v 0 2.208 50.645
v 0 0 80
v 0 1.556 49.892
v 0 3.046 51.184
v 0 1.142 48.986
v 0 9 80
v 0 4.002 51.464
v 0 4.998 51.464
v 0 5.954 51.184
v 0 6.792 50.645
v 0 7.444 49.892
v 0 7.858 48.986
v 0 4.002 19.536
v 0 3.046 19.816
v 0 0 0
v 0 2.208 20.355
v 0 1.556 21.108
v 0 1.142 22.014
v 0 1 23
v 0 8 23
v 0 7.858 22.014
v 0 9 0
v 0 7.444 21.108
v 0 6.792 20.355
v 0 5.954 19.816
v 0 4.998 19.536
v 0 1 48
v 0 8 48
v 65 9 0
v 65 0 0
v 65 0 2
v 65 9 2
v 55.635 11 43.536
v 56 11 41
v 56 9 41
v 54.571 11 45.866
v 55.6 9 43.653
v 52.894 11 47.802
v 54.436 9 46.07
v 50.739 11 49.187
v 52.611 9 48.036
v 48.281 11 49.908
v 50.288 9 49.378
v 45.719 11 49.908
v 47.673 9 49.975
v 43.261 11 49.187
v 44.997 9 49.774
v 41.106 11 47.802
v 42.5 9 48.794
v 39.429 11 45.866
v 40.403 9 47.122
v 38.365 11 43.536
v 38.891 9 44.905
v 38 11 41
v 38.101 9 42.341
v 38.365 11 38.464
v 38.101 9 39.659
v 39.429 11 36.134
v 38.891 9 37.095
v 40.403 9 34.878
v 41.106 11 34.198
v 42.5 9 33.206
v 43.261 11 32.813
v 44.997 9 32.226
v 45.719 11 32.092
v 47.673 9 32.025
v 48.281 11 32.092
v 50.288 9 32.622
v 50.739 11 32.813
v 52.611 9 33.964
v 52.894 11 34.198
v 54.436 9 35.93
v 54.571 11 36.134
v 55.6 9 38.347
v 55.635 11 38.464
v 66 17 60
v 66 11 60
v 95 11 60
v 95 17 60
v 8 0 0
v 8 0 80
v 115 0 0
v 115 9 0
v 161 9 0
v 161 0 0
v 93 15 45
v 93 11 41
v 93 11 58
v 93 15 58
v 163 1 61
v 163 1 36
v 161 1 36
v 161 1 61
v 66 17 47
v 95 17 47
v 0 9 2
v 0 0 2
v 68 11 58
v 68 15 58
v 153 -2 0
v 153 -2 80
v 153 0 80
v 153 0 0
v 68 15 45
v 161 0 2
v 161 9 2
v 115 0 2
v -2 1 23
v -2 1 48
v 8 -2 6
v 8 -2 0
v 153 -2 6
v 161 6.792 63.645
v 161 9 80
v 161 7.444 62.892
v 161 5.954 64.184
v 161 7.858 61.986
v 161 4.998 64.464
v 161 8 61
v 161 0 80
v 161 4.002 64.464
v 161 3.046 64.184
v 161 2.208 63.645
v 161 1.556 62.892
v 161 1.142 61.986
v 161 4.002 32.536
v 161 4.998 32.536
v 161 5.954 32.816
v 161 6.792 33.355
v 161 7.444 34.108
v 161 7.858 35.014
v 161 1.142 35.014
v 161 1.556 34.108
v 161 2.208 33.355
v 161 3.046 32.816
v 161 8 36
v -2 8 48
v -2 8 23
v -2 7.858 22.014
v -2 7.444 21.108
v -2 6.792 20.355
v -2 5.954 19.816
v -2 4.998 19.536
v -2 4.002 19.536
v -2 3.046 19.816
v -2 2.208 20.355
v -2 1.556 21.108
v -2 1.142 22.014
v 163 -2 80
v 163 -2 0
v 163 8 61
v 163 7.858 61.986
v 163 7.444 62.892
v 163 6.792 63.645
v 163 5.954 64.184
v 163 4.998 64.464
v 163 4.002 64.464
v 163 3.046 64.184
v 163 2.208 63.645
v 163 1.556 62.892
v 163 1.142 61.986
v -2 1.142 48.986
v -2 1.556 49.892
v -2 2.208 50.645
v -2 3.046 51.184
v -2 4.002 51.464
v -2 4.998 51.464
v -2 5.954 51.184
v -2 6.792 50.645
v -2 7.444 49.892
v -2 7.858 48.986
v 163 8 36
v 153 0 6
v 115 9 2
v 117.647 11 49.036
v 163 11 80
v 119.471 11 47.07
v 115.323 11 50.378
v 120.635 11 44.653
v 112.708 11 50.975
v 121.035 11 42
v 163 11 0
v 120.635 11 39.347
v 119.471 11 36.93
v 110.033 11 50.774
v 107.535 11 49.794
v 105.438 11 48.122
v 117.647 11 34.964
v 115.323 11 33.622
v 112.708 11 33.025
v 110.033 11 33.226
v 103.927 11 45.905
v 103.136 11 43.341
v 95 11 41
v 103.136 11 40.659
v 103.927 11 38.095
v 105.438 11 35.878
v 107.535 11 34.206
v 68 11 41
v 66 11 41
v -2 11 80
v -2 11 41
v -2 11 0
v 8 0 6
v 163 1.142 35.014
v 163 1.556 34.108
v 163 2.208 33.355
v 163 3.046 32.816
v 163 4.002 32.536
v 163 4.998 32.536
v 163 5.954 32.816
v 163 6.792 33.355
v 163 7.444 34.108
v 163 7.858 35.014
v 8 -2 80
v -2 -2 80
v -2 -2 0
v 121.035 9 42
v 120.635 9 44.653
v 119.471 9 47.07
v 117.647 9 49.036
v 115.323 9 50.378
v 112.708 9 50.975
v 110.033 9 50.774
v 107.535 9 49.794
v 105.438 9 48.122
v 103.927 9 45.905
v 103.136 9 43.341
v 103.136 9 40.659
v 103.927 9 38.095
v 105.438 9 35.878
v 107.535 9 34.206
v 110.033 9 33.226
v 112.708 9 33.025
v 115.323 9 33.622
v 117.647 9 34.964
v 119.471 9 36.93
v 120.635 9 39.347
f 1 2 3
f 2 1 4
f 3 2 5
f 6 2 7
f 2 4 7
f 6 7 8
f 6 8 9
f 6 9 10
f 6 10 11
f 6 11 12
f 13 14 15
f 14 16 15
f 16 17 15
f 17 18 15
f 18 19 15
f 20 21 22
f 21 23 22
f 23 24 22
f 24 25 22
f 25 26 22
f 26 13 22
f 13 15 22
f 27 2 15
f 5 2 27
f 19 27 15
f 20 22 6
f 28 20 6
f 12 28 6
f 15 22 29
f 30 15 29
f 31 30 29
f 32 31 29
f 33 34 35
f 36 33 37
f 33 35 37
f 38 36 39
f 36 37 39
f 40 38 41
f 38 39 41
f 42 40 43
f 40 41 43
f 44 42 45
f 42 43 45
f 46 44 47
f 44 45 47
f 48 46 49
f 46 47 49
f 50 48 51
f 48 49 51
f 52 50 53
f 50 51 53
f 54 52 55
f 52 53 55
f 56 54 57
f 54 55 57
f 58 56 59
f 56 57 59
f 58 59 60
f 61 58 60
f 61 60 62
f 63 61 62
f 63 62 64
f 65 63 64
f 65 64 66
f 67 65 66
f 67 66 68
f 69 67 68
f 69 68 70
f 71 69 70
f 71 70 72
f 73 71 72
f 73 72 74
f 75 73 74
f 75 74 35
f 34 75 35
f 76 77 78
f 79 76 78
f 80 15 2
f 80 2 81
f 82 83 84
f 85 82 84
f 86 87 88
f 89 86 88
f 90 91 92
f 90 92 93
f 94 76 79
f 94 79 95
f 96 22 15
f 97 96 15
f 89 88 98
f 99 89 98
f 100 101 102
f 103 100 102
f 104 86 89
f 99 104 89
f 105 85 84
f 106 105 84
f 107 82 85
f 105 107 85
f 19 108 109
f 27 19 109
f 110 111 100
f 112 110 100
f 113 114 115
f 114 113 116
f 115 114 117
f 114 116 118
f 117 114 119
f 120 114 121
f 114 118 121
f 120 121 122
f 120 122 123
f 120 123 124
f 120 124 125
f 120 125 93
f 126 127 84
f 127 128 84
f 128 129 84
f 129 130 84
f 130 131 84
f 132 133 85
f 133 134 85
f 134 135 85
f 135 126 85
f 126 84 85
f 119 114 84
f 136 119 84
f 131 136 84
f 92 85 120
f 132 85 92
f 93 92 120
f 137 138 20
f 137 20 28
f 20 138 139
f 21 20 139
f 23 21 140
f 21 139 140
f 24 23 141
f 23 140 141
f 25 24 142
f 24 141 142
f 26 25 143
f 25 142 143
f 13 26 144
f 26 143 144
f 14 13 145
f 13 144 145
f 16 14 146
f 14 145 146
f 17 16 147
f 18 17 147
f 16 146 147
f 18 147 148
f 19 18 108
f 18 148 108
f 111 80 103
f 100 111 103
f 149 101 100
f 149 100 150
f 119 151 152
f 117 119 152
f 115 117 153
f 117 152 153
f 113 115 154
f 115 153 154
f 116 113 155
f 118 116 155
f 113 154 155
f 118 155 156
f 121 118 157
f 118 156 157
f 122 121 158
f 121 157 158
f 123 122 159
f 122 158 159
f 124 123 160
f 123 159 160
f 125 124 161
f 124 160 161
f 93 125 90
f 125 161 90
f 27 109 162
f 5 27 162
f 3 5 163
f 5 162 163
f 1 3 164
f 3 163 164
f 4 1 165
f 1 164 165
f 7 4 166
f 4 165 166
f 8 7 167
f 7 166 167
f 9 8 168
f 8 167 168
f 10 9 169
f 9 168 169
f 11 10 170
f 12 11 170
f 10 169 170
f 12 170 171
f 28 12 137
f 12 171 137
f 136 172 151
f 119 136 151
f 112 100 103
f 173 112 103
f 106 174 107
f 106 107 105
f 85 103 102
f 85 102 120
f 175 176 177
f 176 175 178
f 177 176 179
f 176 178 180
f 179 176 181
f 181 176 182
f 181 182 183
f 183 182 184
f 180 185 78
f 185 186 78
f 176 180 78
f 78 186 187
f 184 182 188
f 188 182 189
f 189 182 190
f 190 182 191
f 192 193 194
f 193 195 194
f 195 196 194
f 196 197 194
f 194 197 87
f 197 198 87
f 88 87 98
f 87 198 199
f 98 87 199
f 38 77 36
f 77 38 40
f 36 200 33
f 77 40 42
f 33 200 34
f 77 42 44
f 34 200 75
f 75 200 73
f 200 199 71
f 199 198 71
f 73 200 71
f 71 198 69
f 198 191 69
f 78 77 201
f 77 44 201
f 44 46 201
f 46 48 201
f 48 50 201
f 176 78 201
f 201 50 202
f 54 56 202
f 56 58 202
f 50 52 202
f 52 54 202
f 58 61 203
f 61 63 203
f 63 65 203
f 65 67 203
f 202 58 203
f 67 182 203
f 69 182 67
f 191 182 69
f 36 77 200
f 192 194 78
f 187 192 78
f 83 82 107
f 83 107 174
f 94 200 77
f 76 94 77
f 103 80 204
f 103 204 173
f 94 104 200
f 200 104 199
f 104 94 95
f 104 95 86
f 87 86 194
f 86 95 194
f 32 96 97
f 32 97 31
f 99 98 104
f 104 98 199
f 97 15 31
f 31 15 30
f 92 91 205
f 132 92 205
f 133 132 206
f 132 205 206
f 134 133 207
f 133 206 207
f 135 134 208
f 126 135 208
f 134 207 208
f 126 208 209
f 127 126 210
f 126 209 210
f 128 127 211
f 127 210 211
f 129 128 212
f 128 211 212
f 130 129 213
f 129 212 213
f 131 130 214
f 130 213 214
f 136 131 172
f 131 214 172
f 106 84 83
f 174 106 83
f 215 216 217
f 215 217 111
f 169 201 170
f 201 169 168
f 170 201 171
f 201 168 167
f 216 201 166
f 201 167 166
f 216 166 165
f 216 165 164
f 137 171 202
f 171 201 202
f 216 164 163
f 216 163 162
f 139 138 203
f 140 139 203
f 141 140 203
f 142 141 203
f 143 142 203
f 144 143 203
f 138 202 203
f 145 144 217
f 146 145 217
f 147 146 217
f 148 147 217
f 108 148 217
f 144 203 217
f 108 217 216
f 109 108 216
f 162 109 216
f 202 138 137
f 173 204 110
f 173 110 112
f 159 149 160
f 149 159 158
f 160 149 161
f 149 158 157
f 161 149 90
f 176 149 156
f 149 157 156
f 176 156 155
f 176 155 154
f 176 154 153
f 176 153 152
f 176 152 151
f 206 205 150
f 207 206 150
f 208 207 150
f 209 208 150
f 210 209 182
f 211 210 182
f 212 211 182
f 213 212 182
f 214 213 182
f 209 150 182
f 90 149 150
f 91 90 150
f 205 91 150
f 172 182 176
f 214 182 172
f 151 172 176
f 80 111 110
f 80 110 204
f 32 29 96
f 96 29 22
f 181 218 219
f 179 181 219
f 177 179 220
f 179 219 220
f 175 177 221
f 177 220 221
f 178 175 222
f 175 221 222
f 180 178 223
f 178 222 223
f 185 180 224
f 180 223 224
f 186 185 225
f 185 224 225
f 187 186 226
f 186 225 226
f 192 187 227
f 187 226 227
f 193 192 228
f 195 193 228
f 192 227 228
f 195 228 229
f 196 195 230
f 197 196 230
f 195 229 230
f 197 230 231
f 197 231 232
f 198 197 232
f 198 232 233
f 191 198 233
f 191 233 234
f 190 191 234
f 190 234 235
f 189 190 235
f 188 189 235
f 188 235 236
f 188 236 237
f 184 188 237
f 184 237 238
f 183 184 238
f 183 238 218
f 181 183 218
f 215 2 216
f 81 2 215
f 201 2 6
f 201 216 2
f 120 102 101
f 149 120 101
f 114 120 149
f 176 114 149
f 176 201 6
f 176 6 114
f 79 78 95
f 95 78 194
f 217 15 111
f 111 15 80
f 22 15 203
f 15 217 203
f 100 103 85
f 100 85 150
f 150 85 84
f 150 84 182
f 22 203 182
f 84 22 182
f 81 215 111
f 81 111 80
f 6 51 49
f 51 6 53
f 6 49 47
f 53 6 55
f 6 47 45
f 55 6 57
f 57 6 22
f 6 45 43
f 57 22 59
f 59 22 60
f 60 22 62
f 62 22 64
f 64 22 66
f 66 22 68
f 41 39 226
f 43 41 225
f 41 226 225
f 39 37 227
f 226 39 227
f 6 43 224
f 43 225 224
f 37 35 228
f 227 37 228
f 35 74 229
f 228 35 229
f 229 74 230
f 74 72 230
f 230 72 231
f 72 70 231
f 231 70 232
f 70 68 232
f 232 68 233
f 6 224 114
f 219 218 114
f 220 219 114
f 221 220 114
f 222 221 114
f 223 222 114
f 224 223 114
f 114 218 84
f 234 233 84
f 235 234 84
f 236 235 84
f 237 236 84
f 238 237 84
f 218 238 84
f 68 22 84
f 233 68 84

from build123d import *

# Parameters (mm, degrees)
F0_W      = 161
F0_H      = 2
F0_W_2    = 2
F0_H_2    = 9
F0_W_3    = 8
F1_DEPTH  = 80
F2_DEPTH  = 2
F0_W_4    = 145
F3_DEPTH  = 6
F4_W      = 7
F4_H      = 25
F5_DEPTH  = 2
F6_W      = 7
F6_H      = 25
F7_DEPTH  = 2
F8_R      = 9
F9_DEPTH  = 11.001
F10_W     = 2
F10_H     = 6
F10_H_2   = 11
F10_H_3   = 2
F11_DEPTH = 6
F13_DEPTH = 25
F15_DEPTH = 97.001
F16_W     = 50
F16_H     = 9
F17_DEPTH = 2


with BuildPart() as f1:
    # F0 (on Top) → F1 (new body)
    with BuildSketch(Plane.XY):
        with Locations((80.5, 10)):
            Rectangle(F0_W, F0_H)
        with Locations((162, 10)):
            Rectangle(F0_W_2, F0_H)
        with Locations((162, 4.5)):
            Rectangle(F0_W_2, F0_H_2)
        with Locations((162, -1)):
            Rectangle(F0_W_2, F0_H)
        with Locations((157, -1)):
            Rectangle(F0_W_3, F0_H)
        with Locations((-1, 10)):
            Rectangle(F0_W_2, F0_H)
        with Locations((-1, 4.5)):
            Rectangle(F0_W_2, F0_H_2)
        with Locations((-1, -1)):
            Rectangle(F0_W_2, F0_H)
        with Locations((4, -1)):
            Rectangle(F0_W_3, F0_H)
    extrude(amount=F1_DEPTH)

    # F4 (on face) → F5 (cut, through all)
    with BuildSketch(Plane(origin=(-2, 0, 0), x_dir=(0, -1, 0), z_dir=(-1, 0, 0))):
        with BuildLine():
            ThreePointArc((-1, 48), (-4.5, 51.5), (-8, 48))
            Line((-8, 48), (-1, 48))
        make_face()
        with Locations((-4.5, 35.5)):
            Rectangle(F4_W, F4_H)
        with BuildLine():
            Line((-1, 23), (-8, 23))
            ThreePointArc((-8, 23), (-4.5, 19.5), (-1, 23))
        make_face()
    extrude(amount=-F5_DEPTH, mode=Mode.SUBTRACT)

    # F6 (on face) → F7 (cut, through all)
    with BuildSketch(Plane.YZ.offset(163)):
        with BuildLine():
            ThreePointArc((8, 61), (4.5, 64.5), (1, 61))
            Line((1, 61), (8, 61))
        make_face()
        with Locations((4.5, 48.5)):
            Rectangle(F6_W, F6_H)
        with BuildLine():
            Line((8, 36), (1, 36))
            ThreePointArc((1, 36), (4.5, 32.5), (8, 36))
        make_face()
    extrude(amount=-F7_DEPTH, mode=Mode.SUBTRACT)

    # F8 (on Front) → F9 (cut, through all)
    with BuildSketch(Plane.XZ):
        with Locations((47, 41)):
            Circle(F8_R)
        with Locations((112.035342, 42)):
            Circle(F8_R)
    extrude(amount=-F9_DEPTH, mode=Mode.SUBTRACT)

    # F10 (on face) → F11 (join)
    with BuildSketch(Plane(origin=(0, 11, 0), x_dir=(-1, 0, 0), z_dir=(0, 1, 0))):
        with Locations((-94, 44)):
            Rectangle(F10_W, F10_H)
        with Locations((-94, 52.5)):
            Rectangle(F10_W, F10_H_2)
        with Locations((-94, 59)):
            Rectangle(F10_W, F10_H_3)
        Polygon((-93, 58), (-80.5, 58), (-68, 58), (-68, 60), (-93, 60), align=None)
        with Locations((-67, 59)):
            Rectangle(F10_W, F10_H_3)
        with Locations((-67, 52.5)):
            Rectangle(F10_W, F10_H_2)
        with Locations((-67, 44)):
            Rectangle(F10_W, F10_H)
    extrude(amount=F11_DEPTH)

    # F12 (on face) → F13 (join, through all)
    with BuildSketch(Plane(origin=(93, 0, 0), x_dir=(0, -1, 0), z_dir=(-1, 0, 0))):
        Polygon((-15, 58), (-17, 58), (-17, 41), (-15, 41), (-15, 47), align=None)
    extrude(amount=F13_DEPTH)

    # F14 (on face) → F15 (cut, through all)
    with BuildSketch(Plane.YZ.offset(95)):
        Polygon((17, 47), (11, 41), (17, 41), align=None)
    extrude(amount=-F15_DEPTH, mode=Mode.SUBTRACT)


with BuildPart() as f2:
    # F0 (on Top) → F2 (new body)
    with BuildSketch(Plane.XY):
        Polygon((0, 9), (0, 0), (8, 0), (153, 0), (161, 0), (161, 9), align=None)
    extrude(amount=F2_DEPTH)

    # F16 (on face) → F17 (cut, through all)
    with BuildSketch(Plane.XY):
        with Locations((90, 4.5)):
            Rectangle(F16_W, F16_H)
    extrude(amount=F17_DEPTH, mode=Mode.SUBTRACT)


with BuildPart() as f3:
    # F0 (on Top) → F3 (new body)
    with BuildSketch(Plane.XY):
        with Locations((80.5, -1)):
            Rectangle(F0_W_4, F0_H)
    extrude(amount=F3_DEPTH)


solid = Compound([f1.part, f2.part, f3.part])
